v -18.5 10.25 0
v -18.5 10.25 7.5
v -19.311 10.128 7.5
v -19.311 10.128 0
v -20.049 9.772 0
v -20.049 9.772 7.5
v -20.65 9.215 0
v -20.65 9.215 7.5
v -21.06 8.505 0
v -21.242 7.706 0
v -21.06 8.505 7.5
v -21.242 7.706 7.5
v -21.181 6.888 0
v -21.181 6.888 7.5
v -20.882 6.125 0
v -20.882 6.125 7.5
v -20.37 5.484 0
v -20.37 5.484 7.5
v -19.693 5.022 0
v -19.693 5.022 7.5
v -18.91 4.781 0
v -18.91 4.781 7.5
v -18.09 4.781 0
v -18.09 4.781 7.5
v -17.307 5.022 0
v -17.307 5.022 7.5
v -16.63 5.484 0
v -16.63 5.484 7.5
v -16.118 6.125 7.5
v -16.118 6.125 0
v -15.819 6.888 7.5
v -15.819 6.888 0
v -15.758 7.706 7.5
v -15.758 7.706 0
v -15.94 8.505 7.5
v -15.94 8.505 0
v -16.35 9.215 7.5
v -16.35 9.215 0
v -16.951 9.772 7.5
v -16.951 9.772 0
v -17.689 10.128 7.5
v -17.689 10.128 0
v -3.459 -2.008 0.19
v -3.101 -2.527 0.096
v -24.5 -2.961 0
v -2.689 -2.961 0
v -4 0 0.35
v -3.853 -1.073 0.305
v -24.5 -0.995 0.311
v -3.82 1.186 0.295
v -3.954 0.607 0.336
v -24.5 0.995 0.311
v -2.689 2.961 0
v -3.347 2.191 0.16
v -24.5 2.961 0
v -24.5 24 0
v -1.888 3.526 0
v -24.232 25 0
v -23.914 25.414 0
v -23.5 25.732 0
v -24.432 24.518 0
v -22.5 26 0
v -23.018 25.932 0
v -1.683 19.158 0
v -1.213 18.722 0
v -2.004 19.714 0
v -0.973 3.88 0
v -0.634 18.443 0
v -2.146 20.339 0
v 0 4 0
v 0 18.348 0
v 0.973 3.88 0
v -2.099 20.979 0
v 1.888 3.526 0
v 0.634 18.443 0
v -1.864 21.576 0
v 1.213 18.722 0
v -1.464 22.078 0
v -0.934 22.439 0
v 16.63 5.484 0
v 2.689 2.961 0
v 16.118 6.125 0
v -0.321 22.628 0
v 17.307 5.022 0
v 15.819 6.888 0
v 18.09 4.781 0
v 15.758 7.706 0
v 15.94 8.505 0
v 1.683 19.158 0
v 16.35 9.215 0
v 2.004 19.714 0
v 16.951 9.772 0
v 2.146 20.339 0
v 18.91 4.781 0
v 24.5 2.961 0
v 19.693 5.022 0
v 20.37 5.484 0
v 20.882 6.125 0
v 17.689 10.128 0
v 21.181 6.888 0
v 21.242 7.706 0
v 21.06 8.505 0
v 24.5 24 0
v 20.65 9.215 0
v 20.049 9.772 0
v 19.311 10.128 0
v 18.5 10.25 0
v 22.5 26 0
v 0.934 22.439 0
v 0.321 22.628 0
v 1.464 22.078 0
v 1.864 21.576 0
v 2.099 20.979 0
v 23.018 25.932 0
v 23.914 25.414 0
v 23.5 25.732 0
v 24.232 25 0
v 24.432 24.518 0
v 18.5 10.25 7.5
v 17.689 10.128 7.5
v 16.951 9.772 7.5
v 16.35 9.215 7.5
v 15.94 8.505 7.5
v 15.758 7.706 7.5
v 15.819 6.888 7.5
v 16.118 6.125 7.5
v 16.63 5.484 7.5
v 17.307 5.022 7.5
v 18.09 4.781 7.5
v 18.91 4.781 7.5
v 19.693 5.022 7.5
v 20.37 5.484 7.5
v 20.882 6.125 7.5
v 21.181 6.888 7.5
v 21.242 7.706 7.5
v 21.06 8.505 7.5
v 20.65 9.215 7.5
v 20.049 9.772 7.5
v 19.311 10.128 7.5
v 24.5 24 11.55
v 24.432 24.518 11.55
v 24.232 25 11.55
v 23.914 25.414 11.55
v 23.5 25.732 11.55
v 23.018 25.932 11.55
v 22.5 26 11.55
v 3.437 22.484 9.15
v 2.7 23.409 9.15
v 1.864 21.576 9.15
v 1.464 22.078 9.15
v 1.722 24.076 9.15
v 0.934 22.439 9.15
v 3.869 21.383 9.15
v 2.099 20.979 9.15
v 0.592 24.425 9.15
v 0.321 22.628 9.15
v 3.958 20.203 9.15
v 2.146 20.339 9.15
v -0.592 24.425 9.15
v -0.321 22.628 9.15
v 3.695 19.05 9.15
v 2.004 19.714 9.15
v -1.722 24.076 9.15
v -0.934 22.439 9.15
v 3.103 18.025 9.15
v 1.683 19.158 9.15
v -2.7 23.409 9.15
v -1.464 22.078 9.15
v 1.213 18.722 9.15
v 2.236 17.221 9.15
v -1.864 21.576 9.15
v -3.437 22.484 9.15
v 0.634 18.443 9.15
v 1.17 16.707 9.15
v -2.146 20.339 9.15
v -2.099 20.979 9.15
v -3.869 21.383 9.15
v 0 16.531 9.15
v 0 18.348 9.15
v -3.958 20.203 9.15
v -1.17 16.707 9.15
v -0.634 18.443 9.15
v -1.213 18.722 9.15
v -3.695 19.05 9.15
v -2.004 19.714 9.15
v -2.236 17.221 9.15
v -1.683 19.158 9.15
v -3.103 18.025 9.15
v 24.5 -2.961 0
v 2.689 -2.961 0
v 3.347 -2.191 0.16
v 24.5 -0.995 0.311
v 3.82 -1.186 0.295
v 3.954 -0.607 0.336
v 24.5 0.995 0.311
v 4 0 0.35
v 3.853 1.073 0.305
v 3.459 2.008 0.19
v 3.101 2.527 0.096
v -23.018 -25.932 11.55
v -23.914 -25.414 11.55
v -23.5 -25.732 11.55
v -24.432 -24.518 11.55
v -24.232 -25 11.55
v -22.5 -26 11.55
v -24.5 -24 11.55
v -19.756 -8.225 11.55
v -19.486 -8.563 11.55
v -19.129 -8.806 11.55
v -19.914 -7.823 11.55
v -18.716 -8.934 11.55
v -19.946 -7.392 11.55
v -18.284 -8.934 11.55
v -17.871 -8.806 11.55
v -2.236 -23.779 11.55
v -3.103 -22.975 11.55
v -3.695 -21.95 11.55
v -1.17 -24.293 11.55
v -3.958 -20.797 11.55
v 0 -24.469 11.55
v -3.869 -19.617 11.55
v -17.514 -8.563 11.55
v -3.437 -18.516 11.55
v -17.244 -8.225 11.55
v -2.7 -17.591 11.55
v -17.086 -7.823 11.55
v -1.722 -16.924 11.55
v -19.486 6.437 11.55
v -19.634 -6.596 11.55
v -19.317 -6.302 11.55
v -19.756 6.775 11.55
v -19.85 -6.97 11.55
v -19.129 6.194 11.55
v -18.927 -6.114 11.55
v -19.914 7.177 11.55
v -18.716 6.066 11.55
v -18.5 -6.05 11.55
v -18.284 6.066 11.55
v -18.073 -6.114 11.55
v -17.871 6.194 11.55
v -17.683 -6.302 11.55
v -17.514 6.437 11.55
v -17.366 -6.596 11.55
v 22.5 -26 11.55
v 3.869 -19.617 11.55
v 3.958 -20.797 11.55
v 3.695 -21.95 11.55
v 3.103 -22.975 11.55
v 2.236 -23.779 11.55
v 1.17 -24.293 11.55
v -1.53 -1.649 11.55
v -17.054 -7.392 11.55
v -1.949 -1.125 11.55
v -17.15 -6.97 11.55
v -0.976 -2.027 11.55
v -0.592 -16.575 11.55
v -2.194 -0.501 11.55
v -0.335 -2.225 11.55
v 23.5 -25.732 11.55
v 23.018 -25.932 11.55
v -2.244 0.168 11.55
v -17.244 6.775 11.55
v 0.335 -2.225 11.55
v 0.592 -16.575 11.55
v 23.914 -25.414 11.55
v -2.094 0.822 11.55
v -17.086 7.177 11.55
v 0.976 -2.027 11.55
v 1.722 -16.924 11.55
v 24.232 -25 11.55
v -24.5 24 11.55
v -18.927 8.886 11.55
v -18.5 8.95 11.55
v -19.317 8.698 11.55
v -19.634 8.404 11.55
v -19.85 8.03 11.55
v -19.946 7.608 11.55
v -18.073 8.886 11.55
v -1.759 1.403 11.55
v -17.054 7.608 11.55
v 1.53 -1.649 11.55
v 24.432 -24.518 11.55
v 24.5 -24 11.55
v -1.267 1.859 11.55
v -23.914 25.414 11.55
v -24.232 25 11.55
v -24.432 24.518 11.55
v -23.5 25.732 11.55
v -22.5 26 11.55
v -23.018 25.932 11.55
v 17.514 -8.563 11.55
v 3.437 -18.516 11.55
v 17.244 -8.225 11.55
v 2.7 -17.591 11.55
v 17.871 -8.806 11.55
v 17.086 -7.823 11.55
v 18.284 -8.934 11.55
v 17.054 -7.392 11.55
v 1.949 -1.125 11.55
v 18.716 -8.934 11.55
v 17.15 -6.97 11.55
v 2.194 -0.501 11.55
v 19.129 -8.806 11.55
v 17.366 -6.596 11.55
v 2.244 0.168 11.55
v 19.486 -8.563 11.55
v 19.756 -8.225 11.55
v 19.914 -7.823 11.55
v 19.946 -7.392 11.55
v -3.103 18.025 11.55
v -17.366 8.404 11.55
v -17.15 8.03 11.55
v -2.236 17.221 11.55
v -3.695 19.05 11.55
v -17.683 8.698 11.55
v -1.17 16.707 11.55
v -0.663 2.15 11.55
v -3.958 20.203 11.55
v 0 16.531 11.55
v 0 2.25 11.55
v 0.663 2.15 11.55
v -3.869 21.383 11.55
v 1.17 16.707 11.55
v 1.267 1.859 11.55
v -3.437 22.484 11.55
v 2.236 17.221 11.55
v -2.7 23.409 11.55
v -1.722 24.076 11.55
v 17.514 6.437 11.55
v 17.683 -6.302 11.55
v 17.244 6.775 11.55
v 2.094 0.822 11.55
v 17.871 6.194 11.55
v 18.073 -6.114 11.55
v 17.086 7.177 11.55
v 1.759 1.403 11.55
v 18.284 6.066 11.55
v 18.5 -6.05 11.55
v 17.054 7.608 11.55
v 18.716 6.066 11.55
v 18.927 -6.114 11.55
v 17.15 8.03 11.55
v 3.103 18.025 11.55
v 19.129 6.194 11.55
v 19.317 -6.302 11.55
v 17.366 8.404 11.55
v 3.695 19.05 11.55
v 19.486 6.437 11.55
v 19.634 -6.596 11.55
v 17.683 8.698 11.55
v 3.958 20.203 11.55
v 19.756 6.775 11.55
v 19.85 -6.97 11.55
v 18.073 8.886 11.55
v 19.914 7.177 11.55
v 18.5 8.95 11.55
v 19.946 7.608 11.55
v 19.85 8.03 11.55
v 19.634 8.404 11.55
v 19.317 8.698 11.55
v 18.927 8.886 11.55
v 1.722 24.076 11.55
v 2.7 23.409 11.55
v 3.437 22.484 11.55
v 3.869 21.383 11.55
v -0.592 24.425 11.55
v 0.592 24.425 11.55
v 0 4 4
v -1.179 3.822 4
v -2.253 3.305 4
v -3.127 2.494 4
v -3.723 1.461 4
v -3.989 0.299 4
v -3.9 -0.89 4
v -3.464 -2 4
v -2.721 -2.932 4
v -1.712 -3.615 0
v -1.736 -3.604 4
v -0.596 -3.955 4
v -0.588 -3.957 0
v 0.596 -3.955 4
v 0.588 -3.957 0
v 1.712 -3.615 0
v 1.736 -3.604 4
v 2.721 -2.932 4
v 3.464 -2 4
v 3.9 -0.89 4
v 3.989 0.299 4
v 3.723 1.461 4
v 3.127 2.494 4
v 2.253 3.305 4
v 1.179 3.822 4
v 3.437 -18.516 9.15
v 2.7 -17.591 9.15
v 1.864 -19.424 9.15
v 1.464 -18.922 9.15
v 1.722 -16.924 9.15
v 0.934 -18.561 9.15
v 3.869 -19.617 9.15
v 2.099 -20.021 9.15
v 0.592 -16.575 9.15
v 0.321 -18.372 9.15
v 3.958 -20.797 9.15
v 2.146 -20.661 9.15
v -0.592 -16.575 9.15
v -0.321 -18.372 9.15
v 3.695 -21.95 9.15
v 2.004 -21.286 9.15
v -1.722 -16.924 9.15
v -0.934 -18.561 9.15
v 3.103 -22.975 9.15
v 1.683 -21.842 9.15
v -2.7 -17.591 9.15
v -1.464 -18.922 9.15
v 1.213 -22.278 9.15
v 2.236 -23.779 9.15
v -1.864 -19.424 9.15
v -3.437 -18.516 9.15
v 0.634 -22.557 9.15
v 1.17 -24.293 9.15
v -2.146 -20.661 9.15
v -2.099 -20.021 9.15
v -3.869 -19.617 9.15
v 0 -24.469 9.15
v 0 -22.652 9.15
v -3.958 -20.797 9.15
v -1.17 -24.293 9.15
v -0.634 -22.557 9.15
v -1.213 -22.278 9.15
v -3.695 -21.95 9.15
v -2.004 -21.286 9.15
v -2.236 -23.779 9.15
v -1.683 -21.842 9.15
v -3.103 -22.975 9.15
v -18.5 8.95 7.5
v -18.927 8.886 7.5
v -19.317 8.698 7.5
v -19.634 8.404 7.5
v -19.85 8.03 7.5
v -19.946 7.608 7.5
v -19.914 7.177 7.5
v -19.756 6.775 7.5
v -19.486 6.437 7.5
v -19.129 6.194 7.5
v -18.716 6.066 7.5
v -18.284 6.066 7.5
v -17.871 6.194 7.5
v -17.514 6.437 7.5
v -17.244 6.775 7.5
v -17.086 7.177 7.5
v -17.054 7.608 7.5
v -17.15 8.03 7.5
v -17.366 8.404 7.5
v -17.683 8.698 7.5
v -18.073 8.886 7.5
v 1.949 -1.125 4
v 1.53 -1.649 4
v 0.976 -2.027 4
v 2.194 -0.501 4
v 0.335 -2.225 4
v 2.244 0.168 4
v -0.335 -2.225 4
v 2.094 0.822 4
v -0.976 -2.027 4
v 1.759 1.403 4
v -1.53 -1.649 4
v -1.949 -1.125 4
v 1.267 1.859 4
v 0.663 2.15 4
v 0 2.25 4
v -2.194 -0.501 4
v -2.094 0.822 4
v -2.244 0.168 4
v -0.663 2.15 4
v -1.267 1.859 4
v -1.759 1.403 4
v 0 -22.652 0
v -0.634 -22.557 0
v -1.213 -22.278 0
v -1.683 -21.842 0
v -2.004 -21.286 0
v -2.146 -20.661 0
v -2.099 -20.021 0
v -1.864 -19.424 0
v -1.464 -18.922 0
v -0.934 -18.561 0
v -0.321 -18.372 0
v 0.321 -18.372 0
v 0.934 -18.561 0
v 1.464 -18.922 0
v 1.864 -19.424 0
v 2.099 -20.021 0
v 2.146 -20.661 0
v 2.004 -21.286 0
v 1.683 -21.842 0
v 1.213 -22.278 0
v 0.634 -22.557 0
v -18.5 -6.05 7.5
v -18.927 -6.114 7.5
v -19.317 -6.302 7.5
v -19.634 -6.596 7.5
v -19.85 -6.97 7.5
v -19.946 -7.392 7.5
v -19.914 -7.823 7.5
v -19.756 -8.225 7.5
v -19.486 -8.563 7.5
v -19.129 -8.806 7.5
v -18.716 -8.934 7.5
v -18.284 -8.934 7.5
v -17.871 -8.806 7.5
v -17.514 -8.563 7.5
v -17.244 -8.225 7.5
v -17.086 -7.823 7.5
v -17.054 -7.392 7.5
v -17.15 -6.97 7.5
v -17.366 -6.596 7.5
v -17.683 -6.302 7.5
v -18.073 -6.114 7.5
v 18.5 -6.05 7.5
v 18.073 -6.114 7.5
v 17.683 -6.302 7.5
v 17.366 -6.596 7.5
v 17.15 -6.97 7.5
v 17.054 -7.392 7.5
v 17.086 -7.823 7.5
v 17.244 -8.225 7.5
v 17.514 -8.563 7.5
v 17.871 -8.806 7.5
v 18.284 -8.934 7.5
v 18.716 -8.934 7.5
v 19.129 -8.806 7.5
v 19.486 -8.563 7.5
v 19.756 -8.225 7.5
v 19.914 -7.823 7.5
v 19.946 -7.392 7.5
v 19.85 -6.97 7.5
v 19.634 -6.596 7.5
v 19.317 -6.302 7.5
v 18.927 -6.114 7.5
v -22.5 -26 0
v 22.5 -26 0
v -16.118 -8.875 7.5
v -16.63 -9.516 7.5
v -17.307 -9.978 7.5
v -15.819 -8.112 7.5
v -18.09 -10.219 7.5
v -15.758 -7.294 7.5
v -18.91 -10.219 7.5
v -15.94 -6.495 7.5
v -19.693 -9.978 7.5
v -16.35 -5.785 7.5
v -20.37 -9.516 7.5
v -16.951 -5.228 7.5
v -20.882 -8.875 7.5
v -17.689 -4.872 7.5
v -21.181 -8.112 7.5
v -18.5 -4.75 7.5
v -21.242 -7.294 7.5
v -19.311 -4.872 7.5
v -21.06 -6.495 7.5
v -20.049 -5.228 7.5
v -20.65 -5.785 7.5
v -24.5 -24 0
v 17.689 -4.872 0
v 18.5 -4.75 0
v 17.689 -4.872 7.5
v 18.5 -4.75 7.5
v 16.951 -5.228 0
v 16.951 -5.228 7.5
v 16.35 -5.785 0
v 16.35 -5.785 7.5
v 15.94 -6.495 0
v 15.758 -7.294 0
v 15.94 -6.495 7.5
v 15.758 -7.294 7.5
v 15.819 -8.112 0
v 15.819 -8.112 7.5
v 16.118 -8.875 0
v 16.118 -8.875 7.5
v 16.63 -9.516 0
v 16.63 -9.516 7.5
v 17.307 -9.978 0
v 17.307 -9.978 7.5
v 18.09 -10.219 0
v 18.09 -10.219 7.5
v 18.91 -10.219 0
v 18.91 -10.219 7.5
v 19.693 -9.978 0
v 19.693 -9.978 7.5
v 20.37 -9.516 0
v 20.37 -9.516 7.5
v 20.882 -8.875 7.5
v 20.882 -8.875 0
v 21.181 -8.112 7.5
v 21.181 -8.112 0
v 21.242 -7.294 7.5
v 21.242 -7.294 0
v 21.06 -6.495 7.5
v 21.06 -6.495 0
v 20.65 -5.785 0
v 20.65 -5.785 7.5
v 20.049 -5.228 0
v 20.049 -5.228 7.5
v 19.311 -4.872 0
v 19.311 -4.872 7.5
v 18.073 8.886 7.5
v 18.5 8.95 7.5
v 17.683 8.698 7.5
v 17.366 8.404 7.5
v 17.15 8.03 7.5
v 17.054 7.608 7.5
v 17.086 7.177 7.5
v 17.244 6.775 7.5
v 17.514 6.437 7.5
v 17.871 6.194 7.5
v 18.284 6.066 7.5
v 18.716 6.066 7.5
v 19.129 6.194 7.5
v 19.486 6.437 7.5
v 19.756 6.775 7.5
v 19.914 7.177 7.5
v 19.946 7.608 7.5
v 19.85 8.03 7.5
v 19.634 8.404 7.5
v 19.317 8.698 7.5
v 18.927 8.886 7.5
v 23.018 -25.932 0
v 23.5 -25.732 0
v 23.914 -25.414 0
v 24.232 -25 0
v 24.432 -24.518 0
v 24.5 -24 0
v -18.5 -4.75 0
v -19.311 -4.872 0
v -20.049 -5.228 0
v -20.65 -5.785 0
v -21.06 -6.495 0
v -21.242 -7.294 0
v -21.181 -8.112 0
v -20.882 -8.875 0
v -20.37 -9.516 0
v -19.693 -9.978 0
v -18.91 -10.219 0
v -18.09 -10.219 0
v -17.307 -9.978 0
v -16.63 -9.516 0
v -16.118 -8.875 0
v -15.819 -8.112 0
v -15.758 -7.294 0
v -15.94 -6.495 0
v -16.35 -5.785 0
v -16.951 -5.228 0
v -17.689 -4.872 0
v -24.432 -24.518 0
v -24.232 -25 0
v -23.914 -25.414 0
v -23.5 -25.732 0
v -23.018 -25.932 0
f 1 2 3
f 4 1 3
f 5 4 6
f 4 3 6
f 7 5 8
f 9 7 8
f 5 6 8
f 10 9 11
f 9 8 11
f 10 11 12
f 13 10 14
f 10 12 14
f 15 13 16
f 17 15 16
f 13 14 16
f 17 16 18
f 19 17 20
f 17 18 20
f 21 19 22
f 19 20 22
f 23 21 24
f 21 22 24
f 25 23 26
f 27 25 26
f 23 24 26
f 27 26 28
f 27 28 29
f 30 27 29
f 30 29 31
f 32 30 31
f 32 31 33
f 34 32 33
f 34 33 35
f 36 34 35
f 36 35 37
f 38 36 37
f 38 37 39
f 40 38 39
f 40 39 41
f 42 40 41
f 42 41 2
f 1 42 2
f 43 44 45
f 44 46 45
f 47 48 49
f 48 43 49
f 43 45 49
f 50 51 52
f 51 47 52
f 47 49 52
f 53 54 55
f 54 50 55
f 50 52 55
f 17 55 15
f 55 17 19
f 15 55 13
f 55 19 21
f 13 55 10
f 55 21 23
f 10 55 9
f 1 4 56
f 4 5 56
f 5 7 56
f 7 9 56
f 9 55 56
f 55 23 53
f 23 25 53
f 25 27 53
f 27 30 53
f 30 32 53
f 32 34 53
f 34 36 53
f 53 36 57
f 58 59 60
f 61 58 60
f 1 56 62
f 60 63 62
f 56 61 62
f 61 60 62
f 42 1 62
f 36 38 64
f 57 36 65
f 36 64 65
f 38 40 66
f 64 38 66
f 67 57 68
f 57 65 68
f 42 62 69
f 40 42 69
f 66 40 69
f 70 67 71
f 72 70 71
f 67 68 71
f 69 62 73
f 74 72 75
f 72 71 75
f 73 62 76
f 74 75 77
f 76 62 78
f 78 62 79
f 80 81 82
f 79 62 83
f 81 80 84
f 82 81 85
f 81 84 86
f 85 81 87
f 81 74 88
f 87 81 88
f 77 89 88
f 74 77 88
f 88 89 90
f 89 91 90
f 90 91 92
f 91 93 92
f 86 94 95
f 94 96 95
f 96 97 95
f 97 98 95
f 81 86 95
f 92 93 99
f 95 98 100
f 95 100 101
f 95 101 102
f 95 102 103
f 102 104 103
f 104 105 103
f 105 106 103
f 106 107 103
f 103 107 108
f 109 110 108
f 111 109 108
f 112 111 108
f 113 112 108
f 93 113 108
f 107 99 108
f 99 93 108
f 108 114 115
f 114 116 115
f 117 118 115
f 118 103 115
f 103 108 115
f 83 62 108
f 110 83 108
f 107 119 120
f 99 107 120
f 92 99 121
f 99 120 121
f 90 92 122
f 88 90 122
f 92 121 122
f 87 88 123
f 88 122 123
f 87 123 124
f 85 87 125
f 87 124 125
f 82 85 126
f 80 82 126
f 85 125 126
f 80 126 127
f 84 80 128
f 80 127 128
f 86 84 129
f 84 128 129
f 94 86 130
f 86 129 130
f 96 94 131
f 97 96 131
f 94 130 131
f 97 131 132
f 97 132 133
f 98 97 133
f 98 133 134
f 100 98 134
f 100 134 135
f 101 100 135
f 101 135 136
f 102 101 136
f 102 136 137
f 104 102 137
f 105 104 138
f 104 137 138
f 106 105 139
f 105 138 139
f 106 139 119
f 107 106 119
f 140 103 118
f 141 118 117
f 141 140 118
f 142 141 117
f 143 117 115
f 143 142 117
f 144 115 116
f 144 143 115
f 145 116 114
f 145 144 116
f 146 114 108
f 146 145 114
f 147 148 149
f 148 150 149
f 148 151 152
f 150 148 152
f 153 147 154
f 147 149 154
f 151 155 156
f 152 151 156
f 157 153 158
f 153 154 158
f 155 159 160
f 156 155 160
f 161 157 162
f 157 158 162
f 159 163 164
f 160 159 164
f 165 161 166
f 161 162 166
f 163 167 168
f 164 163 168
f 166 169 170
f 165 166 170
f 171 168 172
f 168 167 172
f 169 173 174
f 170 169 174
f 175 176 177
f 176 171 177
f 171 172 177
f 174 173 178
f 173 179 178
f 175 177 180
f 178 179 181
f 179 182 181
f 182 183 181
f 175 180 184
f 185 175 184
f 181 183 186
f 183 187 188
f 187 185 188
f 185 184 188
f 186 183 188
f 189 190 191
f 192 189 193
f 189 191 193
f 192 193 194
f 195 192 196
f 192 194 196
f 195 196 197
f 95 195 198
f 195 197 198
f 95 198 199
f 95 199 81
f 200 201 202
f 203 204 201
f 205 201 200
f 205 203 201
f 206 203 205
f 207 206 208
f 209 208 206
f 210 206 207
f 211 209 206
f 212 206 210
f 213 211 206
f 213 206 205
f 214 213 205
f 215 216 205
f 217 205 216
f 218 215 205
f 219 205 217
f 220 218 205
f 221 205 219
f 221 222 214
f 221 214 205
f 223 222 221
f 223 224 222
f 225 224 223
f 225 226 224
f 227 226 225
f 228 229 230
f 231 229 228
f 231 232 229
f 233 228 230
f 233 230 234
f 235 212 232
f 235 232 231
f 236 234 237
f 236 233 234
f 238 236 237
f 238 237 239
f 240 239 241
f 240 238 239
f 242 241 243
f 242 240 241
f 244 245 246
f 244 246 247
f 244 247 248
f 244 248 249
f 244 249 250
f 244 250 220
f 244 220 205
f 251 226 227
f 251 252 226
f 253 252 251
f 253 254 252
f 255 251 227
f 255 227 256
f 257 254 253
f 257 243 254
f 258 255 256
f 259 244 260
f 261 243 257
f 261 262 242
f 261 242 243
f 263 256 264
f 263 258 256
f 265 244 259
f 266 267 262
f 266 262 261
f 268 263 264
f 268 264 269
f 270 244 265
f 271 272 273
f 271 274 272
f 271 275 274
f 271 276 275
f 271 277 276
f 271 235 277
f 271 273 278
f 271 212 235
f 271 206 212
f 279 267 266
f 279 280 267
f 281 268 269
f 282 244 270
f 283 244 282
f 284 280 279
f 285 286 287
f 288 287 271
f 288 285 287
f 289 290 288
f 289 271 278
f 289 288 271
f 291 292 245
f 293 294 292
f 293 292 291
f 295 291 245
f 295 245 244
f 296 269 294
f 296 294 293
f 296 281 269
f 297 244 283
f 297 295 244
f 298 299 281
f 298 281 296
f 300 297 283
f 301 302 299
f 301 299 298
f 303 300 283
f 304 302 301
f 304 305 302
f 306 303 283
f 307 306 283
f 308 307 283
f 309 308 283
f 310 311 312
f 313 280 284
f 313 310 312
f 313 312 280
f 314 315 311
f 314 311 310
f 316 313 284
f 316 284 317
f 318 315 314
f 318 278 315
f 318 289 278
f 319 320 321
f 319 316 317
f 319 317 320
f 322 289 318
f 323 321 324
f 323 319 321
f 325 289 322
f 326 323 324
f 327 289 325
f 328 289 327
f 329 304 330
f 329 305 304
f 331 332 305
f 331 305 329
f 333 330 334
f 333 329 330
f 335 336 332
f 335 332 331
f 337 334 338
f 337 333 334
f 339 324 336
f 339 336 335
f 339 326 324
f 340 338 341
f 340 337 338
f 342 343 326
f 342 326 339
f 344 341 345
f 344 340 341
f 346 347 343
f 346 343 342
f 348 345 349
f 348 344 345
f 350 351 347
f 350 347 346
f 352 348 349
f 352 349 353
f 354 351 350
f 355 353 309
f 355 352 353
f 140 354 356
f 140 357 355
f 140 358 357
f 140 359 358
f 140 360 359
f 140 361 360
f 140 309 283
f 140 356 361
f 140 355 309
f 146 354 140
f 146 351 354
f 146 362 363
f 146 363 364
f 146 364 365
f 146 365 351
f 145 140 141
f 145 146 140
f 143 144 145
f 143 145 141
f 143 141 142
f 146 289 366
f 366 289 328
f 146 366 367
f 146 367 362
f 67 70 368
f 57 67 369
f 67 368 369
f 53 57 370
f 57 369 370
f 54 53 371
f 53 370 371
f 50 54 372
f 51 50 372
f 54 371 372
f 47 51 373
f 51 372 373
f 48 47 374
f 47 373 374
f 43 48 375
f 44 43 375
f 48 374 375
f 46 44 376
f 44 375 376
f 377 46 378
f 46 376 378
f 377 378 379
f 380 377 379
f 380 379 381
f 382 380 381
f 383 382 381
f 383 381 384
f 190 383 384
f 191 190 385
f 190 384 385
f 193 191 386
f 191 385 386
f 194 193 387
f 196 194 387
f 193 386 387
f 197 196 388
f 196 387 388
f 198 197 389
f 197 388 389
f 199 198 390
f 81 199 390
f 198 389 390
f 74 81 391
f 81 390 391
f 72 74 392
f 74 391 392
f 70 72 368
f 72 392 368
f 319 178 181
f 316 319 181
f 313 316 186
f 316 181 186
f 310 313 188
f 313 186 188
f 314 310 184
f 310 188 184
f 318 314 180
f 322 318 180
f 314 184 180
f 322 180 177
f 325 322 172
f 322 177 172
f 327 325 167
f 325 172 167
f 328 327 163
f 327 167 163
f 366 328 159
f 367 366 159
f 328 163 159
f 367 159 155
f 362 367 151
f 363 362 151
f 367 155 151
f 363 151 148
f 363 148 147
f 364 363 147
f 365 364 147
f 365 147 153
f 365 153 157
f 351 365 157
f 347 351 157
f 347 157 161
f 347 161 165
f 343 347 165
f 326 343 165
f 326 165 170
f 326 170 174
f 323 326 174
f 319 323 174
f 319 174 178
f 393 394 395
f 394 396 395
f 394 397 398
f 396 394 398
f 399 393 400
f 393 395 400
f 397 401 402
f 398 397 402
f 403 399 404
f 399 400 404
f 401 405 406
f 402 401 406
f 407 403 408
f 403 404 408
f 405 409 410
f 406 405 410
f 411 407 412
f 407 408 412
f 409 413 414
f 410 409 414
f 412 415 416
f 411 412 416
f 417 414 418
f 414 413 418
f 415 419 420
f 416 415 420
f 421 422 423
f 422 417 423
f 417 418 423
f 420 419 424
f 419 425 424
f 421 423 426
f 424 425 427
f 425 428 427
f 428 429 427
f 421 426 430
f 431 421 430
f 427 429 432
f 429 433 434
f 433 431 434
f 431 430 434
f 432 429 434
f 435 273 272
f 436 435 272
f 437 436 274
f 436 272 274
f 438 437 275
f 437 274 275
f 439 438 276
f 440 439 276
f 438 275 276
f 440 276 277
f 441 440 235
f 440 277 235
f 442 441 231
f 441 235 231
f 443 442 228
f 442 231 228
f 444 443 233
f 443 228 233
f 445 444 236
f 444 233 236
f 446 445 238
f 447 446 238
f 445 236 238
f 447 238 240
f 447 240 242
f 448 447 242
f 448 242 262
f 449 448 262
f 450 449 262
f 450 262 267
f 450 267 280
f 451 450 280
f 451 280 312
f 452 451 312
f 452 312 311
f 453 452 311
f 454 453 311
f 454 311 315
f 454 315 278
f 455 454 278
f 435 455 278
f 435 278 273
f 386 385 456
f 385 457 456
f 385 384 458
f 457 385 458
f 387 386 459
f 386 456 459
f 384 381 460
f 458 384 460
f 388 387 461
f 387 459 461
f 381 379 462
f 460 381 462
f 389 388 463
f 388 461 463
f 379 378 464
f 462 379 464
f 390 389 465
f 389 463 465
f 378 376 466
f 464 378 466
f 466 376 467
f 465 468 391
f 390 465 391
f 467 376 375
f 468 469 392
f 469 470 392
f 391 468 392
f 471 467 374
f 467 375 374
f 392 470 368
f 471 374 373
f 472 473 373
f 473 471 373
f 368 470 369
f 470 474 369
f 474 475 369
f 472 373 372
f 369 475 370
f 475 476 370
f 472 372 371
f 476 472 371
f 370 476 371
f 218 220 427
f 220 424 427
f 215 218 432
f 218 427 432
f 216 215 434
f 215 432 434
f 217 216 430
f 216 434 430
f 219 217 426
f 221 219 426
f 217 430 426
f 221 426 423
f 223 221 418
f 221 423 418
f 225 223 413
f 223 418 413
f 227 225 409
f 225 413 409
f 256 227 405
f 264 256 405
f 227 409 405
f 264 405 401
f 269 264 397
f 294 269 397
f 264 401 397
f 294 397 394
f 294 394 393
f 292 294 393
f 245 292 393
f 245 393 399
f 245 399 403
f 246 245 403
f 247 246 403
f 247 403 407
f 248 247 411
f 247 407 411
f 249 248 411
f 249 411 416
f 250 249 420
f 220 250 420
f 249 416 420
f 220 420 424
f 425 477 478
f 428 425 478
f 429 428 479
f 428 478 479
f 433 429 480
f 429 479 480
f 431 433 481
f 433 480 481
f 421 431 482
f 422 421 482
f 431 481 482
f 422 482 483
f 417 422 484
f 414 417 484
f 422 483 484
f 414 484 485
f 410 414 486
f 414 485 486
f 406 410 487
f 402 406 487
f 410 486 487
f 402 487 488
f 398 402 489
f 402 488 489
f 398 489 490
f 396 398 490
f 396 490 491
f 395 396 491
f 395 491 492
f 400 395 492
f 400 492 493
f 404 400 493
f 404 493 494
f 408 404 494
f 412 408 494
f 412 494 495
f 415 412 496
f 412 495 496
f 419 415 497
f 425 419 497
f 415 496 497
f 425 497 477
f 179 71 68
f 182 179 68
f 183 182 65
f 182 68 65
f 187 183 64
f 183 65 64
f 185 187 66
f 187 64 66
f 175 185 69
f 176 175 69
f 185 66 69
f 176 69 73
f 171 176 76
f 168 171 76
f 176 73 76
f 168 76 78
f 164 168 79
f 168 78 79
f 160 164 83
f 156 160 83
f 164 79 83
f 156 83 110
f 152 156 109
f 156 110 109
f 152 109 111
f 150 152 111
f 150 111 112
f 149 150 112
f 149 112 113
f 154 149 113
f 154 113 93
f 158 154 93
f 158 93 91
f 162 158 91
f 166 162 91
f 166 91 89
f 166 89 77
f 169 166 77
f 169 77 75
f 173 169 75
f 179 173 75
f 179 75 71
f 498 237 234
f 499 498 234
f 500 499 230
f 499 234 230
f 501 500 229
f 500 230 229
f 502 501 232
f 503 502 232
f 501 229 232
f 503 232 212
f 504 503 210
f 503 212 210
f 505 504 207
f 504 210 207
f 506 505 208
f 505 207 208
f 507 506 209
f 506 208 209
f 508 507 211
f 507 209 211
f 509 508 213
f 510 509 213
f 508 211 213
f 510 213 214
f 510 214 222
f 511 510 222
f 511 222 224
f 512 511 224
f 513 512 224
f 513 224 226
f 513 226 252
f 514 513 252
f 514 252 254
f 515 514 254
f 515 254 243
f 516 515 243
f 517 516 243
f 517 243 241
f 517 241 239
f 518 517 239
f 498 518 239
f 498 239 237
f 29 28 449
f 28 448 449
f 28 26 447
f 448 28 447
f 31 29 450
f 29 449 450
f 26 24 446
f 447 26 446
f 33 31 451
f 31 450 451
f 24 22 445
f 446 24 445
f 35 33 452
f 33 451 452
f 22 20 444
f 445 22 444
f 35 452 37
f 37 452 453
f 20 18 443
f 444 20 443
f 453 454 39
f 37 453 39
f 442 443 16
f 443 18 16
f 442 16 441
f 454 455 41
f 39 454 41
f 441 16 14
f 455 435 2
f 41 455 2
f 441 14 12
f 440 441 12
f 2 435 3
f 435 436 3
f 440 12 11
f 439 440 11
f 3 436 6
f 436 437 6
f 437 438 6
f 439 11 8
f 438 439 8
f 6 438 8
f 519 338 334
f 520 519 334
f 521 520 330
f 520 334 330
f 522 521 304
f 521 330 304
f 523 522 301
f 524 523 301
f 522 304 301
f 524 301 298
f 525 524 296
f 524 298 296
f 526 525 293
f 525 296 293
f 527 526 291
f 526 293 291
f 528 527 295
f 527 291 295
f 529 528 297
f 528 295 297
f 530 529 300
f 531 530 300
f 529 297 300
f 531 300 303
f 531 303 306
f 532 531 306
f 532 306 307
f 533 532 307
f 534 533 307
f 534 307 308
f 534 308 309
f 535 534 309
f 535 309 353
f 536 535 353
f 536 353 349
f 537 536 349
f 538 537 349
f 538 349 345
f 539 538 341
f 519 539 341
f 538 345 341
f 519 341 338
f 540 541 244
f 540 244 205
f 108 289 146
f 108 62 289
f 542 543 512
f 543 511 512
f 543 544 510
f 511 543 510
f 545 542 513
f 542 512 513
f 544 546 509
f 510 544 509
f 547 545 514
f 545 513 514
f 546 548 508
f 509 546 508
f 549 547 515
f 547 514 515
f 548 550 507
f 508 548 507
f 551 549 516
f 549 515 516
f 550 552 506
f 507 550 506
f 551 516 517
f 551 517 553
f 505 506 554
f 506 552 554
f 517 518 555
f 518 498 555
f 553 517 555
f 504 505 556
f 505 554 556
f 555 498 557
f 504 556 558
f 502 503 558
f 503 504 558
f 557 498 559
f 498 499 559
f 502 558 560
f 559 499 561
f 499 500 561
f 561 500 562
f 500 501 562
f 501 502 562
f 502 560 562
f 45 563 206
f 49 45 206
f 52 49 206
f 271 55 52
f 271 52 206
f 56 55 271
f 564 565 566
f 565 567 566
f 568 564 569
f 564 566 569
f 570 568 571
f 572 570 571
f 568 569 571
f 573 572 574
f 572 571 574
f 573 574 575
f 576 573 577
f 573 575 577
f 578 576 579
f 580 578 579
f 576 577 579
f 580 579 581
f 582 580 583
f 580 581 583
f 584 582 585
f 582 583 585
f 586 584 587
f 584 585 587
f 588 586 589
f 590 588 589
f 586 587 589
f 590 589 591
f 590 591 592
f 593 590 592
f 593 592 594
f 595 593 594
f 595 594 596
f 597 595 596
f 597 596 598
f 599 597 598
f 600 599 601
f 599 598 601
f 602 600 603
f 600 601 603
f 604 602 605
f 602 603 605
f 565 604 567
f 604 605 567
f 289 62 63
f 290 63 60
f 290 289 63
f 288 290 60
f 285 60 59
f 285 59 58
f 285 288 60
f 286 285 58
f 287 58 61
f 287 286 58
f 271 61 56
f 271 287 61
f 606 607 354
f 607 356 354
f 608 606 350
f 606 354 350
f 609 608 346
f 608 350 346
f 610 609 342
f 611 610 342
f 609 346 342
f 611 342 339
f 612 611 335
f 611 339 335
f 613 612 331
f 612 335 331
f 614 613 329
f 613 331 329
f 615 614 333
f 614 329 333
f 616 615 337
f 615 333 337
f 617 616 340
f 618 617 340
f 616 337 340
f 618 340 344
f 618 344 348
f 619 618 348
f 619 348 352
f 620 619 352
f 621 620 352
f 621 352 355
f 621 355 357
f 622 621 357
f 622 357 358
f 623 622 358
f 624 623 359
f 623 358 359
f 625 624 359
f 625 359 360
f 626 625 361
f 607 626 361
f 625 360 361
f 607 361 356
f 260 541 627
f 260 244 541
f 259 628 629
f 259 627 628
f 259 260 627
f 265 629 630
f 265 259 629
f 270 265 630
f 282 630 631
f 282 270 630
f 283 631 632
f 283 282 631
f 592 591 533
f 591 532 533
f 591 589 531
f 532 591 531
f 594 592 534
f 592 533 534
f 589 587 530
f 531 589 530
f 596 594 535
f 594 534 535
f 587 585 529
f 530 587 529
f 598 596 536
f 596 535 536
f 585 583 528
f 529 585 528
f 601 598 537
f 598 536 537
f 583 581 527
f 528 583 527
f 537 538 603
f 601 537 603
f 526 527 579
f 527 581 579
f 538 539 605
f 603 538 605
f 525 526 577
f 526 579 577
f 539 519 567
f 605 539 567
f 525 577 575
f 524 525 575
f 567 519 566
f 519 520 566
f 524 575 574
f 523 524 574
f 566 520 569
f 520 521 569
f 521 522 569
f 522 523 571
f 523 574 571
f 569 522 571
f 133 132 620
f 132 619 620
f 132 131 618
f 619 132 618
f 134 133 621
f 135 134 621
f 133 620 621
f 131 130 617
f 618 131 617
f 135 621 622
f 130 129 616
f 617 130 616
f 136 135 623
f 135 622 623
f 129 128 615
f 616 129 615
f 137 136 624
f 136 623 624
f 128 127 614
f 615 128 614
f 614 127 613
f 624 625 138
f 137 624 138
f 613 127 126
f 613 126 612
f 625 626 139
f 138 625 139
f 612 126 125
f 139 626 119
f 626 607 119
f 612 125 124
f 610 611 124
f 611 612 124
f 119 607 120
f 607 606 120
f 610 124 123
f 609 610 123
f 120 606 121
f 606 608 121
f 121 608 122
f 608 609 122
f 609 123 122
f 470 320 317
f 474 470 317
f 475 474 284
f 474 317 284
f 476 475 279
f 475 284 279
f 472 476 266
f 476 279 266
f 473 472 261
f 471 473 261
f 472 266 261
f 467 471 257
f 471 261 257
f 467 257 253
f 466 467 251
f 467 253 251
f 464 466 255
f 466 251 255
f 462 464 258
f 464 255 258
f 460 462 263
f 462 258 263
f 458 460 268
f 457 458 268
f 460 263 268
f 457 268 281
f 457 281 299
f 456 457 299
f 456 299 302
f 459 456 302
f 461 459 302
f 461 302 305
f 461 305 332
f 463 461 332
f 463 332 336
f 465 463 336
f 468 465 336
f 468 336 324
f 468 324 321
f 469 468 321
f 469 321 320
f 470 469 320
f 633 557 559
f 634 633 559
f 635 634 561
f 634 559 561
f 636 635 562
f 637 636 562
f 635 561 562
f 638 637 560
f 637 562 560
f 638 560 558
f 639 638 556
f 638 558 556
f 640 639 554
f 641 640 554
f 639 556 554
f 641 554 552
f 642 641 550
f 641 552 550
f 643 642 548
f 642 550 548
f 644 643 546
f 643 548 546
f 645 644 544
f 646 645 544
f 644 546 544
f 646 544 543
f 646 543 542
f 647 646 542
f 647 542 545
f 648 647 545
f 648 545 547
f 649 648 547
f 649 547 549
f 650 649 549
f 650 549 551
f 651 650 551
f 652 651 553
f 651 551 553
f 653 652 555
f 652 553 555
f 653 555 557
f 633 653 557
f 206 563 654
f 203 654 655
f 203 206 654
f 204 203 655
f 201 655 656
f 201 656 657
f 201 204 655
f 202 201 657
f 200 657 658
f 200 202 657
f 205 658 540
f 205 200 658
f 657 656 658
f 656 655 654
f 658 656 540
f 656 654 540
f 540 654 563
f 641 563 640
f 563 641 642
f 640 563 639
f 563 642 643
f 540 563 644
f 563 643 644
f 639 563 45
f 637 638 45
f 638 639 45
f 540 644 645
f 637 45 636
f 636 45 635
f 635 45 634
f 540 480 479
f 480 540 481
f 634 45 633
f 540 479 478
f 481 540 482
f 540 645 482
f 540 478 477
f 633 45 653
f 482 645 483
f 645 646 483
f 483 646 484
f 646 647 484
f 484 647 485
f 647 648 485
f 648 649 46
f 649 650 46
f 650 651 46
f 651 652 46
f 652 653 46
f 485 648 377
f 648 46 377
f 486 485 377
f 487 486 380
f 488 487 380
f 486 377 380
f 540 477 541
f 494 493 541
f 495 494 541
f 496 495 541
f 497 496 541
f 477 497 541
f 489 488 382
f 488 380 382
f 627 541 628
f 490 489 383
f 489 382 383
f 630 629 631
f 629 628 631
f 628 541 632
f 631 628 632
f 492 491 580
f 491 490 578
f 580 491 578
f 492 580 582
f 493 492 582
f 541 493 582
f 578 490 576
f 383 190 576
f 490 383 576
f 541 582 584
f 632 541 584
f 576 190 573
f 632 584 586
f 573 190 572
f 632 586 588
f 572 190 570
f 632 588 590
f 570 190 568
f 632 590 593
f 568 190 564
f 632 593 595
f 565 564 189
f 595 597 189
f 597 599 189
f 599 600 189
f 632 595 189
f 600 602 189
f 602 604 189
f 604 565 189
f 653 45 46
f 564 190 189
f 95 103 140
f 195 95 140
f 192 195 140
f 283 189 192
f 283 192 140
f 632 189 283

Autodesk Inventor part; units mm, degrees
ref_plane "YZ Plane" through (0, 0, 0) normal (1, 0, 0) x (0, 1, 0)
ref_plane "XZ Plane" through (0, 0, 0) normal (0, 1, 0) x (-1, 0, 0)
ref_plane "XY Plane" through (0, 0, 0) normal (0, 0, 1) x (1, 0, 0)
sketch "Sketch1" plane through (0, 0, 0) normal (0, 0, 1) x (1, 0, 0)
  line L0 (-24.5, 26) -> (24.5, 26)
  line L1 (24.5, 26) -> (24.5, -26)
  line L2 (24.5, -26) -> (-24.5, -26)
  line L3 (-24.5, -26) -> (-24.5, 26)
  point P0 (0, 0)
  dimension "d0" = 52
  dimension "d1" = 26
  dimension "d2" = 49
  dimension "d3" = 24.5
extrude "Extrusion1" add sketch "Sketch1" along normal blind 11.55
sketch "Sketch3" plane through (0, 0, 11.55) normal (0, 0, 1) x (1, 0, 0)
  line L0 (-24.5, -26) -> (24.5, -26) projected
  line L1 (0, -26) -> (0, -20.5)
  line L2 (24.5, 26) -> (-24.5, 26) projected
  line L3 (0, 26) -> (0, 20.5)
  point P0 (0, 0)
  point P1 (0, 0)
  dimension "d13" = 5.5
  dimension "d14" = 20.5
  dimension "d15" = 5.5
  dimension "d16" = 20.5
hole "Hole1" at (0, 20.5, 11.55) at (0, -20.5, 11.55) direction (0, 0, -1) diameter 4.305 depth 12.3 counterbore diameter 7.938 counterbore depth 2.4 clearance for "Socket Head Cap Screw" size "#8" standard "Ansi Unified Screw Threads"
sketch "Sketch5" plane through (0, 0, 0) normal (0, 0, -1) x (-1, 0, 0)
  line L0 (-24.5, 26) -> (24.5, 26) projected
  line L1 (24.5, 26) -> (24.5, -26) projected
  point P0 (0, 0)
  point P1 (0, 0)
  dimension "d31" = 26
  dimension "d32" = 24.5
hole "Hole3" at (0, 0, 0) direction (0, 0, 1) diameter 4.5 depth 11.8 counterbore diameter 8 counterbore depth 4 clearance for "Socket Head Cap Screw" size "M4" standard "Ansi Metric M Profile"
fillet "Fillet1" radius 2 4 edges at (-24.5, -26, 5.775) (-24.5, 26, 5.775) (24.5, -26, 5.775) (24.5, 26, 5.775)
sketch "Sketch7" plane through (-24.5, -24, 0) normal (-1, 0, 0) x (0, 0, 1)
  circle A0 centre (-12.35, 24) radius 12.7
  point P0 (0, 24)
  dimension "d57" = 25.4
  dimension "d58" = 12.35
extrude "Extrusion3" cut sketch "Sketch7" against normal blind 50
sketch "Sketch10" plane through (0, 0, 0) normal (0, 0, -1) x (-1, 0, 0)
  circle A0 centre (0, 0) radius 1.621
  line L0 (0, 0) -> (-18.5, 0)
  line L1 (-18.5, 0) -> (-18.5, -7.5)
  line L2 (-18.5, -7.5) -> (0, -7.5)
  line L3 (0, -7.5) -> (0, 0)
  point P0 (-18.5, 7.5)
  point P1 (18.5, 7.5)
  point P2 (18.5, -7.5)
  dimension "d77" = 18.5
  dimension "d78" = 7.5
  dimension "d79" = 18.5
  dimension "d80" = 37
  dimension "d81" = 18.5
  dimension "d82" = 7.5
  dimension "d83" = 7.5
  dimension "d84" = 7.5
hole "Hole5" at (18.5, -7.5, 0) at (18.5, 7.5, 0) at (-18.5, 7.5, 0) at (-18.5, -7.5, 0) direction (0, 0, 1) diameter 2.9 end through all counterbore diameter 5.5 counterbore depth 7.5 clearance for "Socket Head Cap Screw" size "M2.5" standard "Ansi Metric M Profile"
equation "\"d1\" = 0.5 * d0"
equation "\"d3\" = 0.5 * d2"
equation "\"d15\" = d13"
equation "\"d79\" = d77"
equation "\"d80\" = 2 * d77"
equation "\"d81\" = d77"
equation "\"d82\" = d78"
equation "\"d83\" = d78"
equation "\"d84\" = d78"
properties part number "ADAPTER_EOM14.7GHz_new"
